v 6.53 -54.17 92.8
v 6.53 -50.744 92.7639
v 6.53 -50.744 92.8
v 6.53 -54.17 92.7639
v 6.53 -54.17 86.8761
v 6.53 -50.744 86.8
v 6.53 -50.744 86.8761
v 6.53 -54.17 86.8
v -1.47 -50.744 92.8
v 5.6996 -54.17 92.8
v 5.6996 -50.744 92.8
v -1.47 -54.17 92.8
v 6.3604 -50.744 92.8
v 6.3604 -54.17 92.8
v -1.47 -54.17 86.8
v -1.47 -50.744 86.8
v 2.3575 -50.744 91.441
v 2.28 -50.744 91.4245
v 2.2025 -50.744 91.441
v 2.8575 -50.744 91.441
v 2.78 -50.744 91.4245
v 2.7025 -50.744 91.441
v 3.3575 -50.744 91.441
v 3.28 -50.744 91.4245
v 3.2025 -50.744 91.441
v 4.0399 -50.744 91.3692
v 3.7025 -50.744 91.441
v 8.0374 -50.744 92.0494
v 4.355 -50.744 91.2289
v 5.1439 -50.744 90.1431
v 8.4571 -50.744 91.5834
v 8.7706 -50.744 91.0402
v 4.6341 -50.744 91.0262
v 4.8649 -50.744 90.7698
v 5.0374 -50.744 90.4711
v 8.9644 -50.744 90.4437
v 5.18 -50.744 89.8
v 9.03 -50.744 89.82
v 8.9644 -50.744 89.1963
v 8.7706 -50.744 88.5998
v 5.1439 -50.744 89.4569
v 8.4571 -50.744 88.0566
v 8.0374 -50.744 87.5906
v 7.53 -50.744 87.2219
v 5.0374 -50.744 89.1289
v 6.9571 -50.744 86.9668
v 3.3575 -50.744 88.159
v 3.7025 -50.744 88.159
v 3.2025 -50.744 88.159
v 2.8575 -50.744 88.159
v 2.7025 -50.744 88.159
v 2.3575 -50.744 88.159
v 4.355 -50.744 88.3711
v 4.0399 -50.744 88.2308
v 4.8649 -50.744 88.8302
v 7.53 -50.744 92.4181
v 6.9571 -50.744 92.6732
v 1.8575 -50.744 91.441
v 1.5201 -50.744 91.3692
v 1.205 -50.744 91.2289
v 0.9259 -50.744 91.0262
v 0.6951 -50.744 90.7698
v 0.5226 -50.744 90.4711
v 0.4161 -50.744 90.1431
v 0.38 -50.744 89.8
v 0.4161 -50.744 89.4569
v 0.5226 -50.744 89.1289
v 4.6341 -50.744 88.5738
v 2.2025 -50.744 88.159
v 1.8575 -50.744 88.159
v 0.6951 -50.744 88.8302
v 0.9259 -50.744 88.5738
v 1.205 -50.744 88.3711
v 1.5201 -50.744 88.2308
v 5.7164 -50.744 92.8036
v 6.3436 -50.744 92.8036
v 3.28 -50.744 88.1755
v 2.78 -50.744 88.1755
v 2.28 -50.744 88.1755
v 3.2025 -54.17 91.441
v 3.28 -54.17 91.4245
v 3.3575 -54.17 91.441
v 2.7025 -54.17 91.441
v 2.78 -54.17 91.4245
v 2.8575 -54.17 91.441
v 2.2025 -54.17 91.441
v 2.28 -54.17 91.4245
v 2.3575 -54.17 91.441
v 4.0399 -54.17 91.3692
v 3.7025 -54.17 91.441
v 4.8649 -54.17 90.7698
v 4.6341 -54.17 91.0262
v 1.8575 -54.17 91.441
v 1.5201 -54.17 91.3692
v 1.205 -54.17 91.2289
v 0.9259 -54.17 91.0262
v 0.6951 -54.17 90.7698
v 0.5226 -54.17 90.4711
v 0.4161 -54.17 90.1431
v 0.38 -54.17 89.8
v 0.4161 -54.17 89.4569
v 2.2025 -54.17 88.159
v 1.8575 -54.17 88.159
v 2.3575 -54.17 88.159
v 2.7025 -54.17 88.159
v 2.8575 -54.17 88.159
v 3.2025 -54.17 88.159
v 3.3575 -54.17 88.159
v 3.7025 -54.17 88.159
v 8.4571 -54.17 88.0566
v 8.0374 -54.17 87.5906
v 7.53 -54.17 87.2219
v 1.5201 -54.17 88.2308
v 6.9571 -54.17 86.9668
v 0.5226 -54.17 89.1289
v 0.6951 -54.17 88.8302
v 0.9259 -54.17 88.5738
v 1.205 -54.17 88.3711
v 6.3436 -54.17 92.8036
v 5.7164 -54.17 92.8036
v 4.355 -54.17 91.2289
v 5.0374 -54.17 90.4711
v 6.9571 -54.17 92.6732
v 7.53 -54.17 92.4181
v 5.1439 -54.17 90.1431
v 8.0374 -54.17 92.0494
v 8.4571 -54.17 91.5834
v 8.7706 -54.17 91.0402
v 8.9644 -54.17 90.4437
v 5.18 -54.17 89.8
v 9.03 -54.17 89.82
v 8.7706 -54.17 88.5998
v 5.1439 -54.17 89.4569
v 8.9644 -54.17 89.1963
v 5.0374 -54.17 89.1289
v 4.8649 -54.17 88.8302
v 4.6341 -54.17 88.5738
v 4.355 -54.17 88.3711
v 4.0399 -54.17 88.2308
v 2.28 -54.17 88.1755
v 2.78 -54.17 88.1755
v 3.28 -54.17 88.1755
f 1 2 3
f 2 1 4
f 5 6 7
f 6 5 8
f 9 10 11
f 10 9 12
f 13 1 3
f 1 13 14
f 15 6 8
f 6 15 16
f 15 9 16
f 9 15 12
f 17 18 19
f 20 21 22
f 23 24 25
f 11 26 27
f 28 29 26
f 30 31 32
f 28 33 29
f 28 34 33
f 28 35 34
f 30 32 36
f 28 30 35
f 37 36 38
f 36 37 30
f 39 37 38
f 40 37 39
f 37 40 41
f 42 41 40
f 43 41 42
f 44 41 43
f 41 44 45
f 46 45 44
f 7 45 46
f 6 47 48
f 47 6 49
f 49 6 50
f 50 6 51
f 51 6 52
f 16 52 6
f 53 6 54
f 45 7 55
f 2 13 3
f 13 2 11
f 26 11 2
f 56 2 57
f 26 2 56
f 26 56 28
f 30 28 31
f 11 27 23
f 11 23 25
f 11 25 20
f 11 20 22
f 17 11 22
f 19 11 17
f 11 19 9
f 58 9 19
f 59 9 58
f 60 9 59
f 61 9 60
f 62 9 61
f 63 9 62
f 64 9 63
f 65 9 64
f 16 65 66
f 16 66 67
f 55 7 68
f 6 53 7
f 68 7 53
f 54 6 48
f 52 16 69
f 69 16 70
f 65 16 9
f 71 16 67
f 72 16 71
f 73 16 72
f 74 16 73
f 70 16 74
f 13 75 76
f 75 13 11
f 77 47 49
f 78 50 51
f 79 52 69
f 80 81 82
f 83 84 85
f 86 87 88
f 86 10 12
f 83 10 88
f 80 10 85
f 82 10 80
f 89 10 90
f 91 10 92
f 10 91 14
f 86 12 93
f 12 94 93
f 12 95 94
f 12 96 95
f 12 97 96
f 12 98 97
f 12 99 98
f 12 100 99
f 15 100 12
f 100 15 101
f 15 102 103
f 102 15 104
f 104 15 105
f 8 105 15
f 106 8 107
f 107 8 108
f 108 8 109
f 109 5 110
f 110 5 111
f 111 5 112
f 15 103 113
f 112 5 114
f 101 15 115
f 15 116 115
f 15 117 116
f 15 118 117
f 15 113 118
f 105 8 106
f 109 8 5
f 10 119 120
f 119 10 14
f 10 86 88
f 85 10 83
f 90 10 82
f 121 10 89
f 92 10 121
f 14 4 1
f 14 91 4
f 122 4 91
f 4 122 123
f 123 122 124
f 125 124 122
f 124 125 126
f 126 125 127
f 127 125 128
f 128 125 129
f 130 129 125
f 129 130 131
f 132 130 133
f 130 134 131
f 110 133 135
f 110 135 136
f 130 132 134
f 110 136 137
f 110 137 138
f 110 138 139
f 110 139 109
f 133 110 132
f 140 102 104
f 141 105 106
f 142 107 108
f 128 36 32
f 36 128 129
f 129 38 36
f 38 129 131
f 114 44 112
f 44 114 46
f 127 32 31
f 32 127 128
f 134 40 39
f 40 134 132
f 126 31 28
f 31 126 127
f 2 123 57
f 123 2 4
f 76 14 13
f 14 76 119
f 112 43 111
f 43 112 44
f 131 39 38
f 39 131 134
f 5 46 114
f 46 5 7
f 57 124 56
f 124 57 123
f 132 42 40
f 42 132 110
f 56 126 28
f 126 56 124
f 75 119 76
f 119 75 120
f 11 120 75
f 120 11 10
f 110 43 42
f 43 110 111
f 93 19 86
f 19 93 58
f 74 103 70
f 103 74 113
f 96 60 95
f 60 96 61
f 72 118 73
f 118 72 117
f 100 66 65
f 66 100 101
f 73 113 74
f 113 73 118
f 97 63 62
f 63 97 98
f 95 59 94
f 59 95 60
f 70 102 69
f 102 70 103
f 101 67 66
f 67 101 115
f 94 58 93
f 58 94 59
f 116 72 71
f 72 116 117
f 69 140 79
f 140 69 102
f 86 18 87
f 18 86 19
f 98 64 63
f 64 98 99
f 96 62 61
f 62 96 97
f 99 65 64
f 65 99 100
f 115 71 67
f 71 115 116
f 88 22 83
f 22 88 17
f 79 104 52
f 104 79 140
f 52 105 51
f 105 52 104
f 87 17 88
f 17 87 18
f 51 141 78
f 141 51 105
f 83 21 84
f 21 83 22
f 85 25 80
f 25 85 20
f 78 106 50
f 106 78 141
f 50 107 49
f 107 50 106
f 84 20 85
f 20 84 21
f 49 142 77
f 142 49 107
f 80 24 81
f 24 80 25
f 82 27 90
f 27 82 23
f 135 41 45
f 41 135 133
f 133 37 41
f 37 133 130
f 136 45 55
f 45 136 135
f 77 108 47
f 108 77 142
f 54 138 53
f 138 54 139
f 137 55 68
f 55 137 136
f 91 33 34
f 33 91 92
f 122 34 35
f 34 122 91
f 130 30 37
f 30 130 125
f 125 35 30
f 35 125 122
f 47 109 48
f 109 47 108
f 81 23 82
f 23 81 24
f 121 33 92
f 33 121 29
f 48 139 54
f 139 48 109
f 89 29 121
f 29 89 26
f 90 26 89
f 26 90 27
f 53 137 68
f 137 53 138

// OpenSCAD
/*
*/
//import("FB17R34INKLQ0U0.stl");
//import("FVTAQF6INKLQ0TC.stl");
//import("FZQ584FINKLQ0T4.stl");
//translate([0,-250,0])import("valveconnectpart.stl");

//translate([0,30,0])rotate([0,90,0])#valveconnectpart_pinchvalve();




//translate([0,30,0])rotate([0,90,0])valveconnectpart_outside();

color("pink")translate([-1.47,-54.17,100-13.2])pinch_valve_tube();

module pinch_valve_tube(){
difference(){union(){
cube([10-2,3.426,6]);
translate([10-2.5,3.426,3.02])rotate([90,0,0])cylinder(r=6/2,h=3.426,$fn=30);
}
#translate([3.5,-10,3])rotate([-90,0,0])cylinder(r=3.3/2,h=30,$fn=30);
#translate([0+4,-10,3])rotate([-90,0,0])cylinder(r=3.3/2,h=30,$fn=30);
#translate([0+4.5,-10,3])rotate([-90,0,0])cylinder(r=3.3/2,h=30,$fn=30);
#translate([0+5,-10,3])rotate([-90,0,0])cylinder(r=3.3/2,h=30,$fn=30);
}
}



module valveconnectpart_outside(){
difference(){
translate([0,0,-2-1.4-1.5+1.2-2+2+1])rotate([0,0,45/2])cylinder(r=15+6.5+1.5,h=10+1.4+1.5-1.2+2-2-1,$fn=8);
translate([0,0,-2-1.4-1.5+1.2-2+2+1-1])cylinder(r=15+0.3,h=10+1.4+1.5-1.2+2-2-1+5);
#translate([-5.16+3,-50-3.08+134-66.1,61.68-128.5+71.5])rotate([0,90,0])cube([3.85,6.6,5.4]);
translate([-5.16+5.5,-50-3.08+134-66.5+3.8,61.68-128.5+71.5-50])rotate([0,0,0])#cylinder(r=3/2,h=100,$fn=30);
translate([0,0,0])rotate([0,0,90]){
#translate([-5.16+3,-50-3.08+134-66.1,61.68-128.5+71.5])rotate([0,90,0])cube([3.85,6.6,5.4]);
translate([-5.16+5.5,-50-3.08+134-66.5+3.8,61.68-128.5+71.5-50])rotate([0,0,0])#cylinder(r=3/2,h=100,$fn=30);
}
translate([0,-0,0])rotate([0,0,180]){
#translate([-5.16+3,-50-3.08+134-66.1,61.68-128.5+71.5])rotate([0,90,0])cube([3.85,6.6,5.4]);
translate([-5.16+5.5,-50-3.08+134-66.5+3.8,61.68-128.5+71.5-50])rotate([0,0,0])#cylinder(r=3/2,h=100,$fn=30);
}
}
}






module valveconnectpart_pinchvalve(){
difference(){
translate([0,0,-2-1.4-1.5+1.2-2+2+1])cylinder(r=15,h=10+1.4+1.5-1.2+2-2-1);
translate([0+18,0-18+15,-2-1.4-1.5+1.2-2+2+1-1])cylinder(r=7,h=11+1.4+1.5-1.2+2-2-1+2);
translate([0,0,-17])cylinder(r=9.5/2,h=18);
translate([0,0,8-2.5])cylinder(r=9.5/2,h=18);
rotate([0,0,-5]){
translate([0,0,-5])rotate([0,0,40])
translate([16.3/2,0,-2])cylinder(r=2.3/2,h=118);
translate([0,0,-5])rotate([0,0,40])
translate([-16.3/2,0,-2])cylinder(r=2.3/2,h=118);
}
rotate([0,0,0]){
translate([0,0,-5])rotate([0,0,40])translate([0,14/2,-2])cylinder(r=2.3/2,h=118);
translate([0,0,-5])rotate([0,0,40])translate([0,-14/2,-2])cylinder(r=2.3/2,h=118);
}
rotate([0,0,-30]){
translate([0,0,-5])rotate([0,0,40])translate([0,22/2,-2])cylinder(r=2.3/2,h=118);
translate([0,0,-5])rotate([0,0,40])translate([0,-22/2,-2])cylinder(r=2.3/2,h=118);
}
rotate([0,0,-65]){
translate([0,0,-5])rotate([0,0,40])translate([0,16/2,-2])cylinder(r=2.3/2,h=118);
translate([0,0,-5])rotate([0,0,40])translate([0,-16/2,-2])cylinder(r=2.3/2,h=118);
}
}
}
